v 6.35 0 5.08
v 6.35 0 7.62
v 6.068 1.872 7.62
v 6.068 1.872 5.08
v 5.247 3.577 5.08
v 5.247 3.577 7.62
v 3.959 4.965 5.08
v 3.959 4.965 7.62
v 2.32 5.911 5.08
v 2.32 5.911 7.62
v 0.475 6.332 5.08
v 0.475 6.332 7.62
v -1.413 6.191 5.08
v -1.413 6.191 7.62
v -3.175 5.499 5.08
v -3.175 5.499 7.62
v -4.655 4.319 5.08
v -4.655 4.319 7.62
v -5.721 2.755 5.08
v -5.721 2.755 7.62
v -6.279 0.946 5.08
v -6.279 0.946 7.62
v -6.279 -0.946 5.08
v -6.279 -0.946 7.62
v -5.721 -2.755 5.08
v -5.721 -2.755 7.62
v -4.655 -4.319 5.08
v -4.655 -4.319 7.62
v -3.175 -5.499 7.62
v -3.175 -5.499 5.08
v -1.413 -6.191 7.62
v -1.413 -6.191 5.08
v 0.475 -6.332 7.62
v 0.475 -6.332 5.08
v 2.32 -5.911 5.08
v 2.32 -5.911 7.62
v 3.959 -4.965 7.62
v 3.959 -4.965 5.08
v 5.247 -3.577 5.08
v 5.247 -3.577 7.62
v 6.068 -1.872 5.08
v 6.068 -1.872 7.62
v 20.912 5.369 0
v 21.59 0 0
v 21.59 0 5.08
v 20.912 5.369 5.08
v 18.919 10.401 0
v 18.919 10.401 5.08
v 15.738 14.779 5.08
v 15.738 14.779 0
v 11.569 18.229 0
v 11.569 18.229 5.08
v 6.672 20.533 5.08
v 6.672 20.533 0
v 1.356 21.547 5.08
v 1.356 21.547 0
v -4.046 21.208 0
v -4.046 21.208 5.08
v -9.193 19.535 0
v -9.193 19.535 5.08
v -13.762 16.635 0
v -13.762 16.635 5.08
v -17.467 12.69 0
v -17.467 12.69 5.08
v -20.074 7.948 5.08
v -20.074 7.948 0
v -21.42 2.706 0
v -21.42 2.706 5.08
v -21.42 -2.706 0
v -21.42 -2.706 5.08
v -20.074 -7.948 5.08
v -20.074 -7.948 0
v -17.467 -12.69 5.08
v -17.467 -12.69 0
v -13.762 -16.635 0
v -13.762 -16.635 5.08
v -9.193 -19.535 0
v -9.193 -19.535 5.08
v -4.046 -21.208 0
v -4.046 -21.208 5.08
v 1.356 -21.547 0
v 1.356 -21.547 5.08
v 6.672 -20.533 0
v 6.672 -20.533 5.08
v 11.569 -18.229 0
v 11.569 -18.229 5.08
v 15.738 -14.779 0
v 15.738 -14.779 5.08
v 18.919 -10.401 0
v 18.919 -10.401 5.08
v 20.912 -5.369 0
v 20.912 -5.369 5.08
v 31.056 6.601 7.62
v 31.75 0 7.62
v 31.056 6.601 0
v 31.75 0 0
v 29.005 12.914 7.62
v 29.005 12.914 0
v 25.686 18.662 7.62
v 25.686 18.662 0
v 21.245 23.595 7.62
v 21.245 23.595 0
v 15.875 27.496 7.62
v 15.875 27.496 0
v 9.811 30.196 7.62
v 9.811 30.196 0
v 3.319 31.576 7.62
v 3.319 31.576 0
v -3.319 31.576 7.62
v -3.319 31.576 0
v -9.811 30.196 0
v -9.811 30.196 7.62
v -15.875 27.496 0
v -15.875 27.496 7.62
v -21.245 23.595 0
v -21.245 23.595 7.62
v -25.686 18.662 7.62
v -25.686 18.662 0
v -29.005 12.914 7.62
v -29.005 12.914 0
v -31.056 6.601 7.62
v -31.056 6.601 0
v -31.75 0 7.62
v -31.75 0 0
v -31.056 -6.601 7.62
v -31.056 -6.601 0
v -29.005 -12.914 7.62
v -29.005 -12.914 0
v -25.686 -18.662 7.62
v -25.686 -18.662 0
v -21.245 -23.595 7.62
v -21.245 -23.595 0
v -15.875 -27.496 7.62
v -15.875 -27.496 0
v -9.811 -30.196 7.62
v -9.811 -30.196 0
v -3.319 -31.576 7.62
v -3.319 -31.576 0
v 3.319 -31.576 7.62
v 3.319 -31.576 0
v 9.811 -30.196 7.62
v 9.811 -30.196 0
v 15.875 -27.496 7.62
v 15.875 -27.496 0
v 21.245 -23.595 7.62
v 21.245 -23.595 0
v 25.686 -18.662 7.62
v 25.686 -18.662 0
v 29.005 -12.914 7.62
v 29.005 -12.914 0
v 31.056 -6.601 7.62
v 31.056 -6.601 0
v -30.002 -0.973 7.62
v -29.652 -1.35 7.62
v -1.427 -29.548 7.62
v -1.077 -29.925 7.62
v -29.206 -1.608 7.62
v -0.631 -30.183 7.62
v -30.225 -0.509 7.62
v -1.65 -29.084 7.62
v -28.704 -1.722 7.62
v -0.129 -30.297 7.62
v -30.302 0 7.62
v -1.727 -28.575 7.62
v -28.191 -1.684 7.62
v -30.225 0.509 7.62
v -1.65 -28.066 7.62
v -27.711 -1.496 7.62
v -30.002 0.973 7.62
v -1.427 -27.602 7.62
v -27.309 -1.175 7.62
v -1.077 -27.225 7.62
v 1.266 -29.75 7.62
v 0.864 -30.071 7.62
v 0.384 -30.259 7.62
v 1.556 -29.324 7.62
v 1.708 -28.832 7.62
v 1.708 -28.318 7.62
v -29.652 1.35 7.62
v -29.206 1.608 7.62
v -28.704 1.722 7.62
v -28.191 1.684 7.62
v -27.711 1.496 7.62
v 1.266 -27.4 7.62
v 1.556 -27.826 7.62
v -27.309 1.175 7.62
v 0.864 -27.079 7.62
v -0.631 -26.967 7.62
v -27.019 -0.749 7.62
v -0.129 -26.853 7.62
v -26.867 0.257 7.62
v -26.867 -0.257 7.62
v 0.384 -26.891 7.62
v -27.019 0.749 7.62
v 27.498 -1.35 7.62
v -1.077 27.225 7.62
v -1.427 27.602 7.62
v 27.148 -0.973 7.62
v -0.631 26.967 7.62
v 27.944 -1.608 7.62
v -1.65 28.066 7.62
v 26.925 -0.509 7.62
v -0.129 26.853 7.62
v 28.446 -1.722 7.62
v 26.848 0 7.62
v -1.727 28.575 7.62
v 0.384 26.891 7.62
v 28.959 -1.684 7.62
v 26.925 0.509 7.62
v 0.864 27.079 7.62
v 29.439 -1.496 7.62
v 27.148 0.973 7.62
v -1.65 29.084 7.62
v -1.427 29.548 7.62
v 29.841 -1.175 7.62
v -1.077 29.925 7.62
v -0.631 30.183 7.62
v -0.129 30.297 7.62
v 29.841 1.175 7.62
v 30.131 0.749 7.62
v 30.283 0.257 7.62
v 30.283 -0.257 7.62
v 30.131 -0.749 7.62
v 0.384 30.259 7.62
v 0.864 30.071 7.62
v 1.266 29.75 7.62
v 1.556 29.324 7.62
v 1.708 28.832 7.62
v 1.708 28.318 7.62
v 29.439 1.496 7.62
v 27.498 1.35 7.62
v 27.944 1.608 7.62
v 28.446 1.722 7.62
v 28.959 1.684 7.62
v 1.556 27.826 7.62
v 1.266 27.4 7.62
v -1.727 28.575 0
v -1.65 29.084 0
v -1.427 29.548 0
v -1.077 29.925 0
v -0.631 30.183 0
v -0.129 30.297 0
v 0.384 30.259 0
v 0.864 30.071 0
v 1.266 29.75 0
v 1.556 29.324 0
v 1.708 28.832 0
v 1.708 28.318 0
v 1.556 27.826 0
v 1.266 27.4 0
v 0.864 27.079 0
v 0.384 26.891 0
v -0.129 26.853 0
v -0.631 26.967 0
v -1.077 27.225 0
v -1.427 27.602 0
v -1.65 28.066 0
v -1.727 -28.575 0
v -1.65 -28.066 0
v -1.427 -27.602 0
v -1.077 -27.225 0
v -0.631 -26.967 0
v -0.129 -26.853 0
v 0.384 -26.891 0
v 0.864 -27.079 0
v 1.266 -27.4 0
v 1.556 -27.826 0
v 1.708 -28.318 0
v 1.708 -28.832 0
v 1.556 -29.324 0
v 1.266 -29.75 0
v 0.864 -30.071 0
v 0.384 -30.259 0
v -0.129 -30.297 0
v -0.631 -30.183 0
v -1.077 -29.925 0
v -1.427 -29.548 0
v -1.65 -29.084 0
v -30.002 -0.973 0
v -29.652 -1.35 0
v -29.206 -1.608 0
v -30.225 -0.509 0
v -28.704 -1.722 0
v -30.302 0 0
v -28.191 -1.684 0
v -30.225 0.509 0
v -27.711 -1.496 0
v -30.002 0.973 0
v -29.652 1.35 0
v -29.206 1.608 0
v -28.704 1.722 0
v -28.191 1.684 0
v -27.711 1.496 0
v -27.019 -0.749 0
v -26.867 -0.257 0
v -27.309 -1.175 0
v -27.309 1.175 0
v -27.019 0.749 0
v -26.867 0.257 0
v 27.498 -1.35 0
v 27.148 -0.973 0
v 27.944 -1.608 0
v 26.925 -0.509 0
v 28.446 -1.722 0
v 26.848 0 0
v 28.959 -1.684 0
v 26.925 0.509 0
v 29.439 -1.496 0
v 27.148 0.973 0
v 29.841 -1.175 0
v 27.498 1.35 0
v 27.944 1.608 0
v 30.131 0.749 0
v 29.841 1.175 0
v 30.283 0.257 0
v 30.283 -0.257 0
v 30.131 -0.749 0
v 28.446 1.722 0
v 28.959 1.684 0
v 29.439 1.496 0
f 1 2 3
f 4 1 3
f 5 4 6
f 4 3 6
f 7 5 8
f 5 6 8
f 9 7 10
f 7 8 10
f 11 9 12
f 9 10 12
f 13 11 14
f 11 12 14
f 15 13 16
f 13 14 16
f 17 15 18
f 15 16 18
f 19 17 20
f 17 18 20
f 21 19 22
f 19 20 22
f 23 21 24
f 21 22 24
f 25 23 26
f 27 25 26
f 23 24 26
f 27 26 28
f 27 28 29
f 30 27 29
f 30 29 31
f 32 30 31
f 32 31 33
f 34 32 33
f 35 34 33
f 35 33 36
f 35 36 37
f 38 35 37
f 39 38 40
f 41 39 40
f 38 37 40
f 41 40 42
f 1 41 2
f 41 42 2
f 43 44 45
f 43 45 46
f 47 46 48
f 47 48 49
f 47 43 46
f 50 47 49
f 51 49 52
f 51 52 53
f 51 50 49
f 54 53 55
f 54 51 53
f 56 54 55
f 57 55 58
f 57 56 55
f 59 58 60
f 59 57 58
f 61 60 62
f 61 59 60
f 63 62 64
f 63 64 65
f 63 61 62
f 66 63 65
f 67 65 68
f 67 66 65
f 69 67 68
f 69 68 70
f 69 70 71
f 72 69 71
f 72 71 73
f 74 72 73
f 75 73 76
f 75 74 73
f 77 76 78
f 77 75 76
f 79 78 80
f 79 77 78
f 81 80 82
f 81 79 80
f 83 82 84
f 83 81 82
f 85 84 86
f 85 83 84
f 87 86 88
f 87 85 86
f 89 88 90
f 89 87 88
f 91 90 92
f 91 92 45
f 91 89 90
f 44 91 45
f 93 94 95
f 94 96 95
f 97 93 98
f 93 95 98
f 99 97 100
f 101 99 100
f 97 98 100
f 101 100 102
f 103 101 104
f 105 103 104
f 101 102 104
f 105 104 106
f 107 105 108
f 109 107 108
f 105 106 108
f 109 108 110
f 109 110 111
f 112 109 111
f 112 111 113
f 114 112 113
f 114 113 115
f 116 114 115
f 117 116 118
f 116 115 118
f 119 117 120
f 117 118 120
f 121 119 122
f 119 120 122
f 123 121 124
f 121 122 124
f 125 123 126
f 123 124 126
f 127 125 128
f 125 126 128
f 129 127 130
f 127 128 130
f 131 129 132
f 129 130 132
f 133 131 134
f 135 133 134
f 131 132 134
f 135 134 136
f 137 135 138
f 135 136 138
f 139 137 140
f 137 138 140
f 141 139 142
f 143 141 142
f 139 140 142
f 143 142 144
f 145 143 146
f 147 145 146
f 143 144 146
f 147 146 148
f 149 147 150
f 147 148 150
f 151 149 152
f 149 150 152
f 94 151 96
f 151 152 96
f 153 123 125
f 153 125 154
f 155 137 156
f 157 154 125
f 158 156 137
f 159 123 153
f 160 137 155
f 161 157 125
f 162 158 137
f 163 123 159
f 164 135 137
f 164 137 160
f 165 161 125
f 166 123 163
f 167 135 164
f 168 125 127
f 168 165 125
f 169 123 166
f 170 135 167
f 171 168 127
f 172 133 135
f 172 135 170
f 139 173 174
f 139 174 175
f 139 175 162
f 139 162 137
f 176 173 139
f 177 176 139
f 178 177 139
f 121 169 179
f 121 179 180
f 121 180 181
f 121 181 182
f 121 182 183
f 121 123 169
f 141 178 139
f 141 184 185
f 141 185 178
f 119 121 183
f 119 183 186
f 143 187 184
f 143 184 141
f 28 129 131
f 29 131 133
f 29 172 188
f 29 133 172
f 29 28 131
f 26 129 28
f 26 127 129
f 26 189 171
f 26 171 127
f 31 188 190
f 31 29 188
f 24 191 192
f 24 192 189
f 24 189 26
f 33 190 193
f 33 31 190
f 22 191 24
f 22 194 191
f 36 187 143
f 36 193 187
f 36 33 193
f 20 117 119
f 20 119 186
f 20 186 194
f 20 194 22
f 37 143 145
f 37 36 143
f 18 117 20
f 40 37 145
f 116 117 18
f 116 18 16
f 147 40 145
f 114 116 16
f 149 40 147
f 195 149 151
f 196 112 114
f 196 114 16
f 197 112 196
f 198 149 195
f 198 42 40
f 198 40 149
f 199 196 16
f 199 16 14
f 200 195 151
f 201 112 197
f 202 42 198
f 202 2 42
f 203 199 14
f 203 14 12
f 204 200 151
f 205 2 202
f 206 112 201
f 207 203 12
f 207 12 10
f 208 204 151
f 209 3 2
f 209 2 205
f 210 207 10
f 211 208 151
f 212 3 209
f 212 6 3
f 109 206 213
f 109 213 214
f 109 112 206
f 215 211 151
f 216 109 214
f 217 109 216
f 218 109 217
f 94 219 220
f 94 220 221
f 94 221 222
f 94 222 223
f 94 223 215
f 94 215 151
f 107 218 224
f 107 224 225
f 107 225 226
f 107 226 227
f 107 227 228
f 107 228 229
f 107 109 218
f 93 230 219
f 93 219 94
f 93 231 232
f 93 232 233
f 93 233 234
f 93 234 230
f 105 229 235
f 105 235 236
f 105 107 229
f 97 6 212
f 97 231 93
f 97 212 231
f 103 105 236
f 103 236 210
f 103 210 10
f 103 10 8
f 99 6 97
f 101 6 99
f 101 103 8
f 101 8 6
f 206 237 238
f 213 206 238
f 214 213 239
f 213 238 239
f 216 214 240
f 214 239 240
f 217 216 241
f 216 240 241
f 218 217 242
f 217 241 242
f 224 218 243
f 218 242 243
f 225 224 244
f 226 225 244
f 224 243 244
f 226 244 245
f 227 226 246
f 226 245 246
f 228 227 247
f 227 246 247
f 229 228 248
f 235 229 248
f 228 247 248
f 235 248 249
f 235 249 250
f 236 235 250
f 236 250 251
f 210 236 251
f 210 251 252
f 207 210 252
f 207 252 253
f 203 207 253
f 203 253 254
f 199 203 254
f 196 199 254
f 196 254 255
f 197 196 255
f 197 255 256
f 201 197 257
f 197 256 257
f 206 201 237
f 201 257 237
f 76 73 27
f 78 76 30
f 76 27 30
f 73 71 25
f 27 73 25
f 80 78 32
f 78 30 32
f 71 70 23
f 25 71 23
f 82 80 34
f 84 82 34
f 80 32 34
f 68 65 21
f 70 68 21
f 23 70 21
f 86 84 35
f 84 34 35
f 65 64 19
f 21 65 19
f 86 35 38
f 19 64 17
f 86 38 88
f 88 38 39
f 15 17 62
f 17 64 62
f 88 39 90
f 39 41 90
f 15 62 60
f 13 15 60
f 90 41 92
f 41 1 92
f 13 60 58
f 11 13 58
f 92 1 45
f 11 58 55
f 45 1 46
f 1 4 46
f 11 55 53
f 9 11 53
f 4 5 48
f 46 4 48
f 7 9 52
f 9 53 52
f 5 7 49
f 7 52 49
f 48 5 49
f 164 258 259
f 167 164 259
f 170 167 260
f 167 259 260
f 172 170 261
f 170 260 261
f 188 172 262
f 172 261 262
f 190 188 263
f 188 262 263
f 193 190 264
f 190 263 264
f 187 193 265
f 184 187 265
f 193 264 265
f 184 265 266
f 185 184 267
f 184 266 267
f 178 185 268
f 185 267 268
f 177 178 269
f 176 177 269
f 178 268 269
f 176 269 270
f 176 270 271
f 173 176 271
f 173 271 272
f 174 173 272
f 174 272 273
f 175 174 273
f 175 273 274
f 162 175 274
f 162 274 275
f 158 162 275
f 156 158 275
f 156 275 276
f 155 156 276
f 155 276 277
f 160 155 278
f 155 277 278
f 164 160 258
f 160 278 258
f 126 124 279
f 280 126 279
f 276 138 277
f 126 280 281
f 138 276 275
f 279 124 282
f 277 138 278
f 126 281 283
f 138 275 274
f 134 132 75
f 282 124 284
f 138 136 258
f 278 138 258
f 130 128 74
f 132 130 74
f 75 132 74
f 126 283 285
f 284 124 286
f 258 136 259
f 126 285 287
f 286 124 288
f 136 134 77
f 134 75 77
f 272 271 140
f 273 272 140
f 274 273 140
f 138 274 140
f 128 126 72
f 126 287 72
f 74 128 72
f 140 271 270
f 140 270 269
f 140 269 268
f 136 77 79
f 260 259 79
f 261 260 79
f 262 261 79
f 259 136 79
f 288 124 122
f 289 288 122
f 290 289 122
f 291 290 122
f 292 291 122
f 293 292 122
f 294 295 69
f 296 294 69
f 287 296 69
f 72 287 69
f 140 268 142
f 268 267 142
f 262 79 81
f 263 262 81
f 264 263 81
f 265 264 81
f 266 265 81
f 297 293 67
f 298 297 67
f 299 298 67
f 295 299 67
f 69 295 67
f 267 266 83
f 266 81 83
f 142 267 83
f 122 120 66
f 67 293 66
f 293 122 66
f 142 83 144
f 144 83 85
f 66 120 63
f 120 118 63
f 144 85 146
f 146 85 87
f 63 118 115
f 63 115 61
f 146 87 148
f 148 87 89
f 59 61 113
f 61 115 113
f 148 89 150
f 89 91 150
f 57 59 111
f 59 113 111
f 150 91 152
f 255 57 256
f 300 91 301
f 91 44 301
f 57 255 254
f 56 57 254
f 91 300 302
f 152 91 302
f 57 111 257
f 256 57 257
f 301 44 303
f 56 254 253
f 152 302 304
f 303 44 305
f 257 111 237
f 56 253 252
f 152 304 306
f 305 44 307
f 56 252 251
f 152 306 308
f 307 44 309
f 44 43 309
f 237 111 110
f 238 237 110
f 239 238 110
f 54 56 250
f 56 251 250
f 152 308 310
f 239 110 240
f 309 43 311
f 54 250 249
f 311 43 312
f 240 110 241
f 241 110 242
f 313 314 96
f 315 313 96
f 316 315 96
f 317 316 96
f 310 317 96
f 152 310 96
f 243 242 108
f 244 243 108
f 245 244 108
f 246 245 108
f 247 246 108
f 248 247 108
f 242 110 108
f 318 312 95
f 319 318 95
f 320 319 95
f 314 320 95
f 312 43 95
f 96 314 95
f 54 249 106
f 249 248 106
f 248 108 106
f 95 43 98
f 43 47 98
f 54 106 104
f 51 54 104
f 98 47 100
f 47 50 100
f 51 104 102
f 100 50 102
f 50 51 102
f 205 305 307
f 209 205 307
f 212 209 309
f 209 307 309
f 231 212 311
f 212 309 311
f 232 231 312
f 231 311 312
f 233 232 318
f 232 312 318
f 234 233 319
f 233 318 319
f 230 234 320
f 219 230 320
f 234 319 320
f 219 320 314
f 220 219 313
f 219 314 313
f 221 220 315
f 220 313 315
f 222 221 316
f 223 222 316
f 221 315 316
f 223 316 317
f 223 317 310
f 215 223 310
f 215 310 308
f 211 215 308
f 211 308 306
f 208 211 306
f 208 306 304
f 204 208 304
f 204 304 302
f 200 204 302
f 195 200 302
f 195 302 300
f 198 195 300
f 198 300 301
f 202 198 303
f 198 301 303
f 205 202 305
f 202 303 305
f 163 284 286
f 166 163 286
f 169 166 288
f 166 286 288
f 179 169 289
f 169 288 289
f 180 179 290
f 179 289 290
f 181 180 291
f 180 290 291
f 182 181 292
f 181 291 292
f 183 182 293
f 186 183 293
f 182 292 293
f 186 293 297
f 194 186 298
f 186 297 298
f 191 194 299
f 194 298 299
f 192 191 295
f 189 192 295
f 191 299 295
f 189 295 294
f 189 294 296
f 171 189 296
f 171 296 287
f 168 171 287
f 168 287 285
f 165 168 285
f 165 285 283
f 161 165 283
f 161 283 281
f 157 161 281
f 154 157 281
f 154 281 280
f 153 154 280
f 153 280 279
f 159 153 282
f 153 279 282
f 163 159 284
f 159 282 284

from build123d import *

# Parameters (mm, degrees)
SKETCH1_R           = 31.75
SKETCH1_R_2         = 21.59
BOSS_EXTRUDE1_DEPTH = 5.08
SKETCH2_R           = 31.75
BOSS_EXTRUDE2_DEPTH = 2.54
SKETCH3_R           = 1.7272
CUT_EXTRUDE1_DEPTH  = 7.62
SKETCH4_R           = 6.35
CUT_EXTRUDE2_DEPTH  = 2.54


with BuildPart() as part:
    # Sketch1 → Boss-Extrude1 (new body)
    with BuildSketch(Plane.XY):
        Circle(SKETCH1_R)
        Circle(SKETCH1_R_2, mode=Mode.SUBTRACT)
    extrude(amount=BOSS_EXTRUDE1_DEPTH)

    # Sketch2 → Boss-Extrude2 (add)
    with BuildSketch(Plane.XY.offset(5.08)):
        Circle(SKETCH2_R)
    extrude(amount=BOSS_EXTRUDE2_DEPTH)

    # Sketch3 → Cut-Extrude1 (cut)
    with BuildSketch(Plane(origin=(0, 0, 0), x_dir=(-1, 0, 0), z_dir=(0, 0, -1))):
        with Locations((0, 28.575)):
            Circle(SKETCH3_R)
        with Locations((28.575, 0)):
            Circle(SKETCH3_R)
        with Locations((0, -28.575)):
            Circle(SKETCH3_R)
        with Locations((-28.575, 0)):
            Circle(SKETCH3_R)
    extrude(amount=-CUT_EXTRUDE1_DEPTH, mode=Mode.SUBTRACT)

    # Sketch4 → Cut-Extrude2 (cut)
    with BuildSketch(Plane.XY.offset(7.62)):
        Circle(SKETCH4_R)
    extrude(amount=-CUT_EXTRUDE2_DEPTH, mode=Mode.SUBTRACT)


solid = part.part
